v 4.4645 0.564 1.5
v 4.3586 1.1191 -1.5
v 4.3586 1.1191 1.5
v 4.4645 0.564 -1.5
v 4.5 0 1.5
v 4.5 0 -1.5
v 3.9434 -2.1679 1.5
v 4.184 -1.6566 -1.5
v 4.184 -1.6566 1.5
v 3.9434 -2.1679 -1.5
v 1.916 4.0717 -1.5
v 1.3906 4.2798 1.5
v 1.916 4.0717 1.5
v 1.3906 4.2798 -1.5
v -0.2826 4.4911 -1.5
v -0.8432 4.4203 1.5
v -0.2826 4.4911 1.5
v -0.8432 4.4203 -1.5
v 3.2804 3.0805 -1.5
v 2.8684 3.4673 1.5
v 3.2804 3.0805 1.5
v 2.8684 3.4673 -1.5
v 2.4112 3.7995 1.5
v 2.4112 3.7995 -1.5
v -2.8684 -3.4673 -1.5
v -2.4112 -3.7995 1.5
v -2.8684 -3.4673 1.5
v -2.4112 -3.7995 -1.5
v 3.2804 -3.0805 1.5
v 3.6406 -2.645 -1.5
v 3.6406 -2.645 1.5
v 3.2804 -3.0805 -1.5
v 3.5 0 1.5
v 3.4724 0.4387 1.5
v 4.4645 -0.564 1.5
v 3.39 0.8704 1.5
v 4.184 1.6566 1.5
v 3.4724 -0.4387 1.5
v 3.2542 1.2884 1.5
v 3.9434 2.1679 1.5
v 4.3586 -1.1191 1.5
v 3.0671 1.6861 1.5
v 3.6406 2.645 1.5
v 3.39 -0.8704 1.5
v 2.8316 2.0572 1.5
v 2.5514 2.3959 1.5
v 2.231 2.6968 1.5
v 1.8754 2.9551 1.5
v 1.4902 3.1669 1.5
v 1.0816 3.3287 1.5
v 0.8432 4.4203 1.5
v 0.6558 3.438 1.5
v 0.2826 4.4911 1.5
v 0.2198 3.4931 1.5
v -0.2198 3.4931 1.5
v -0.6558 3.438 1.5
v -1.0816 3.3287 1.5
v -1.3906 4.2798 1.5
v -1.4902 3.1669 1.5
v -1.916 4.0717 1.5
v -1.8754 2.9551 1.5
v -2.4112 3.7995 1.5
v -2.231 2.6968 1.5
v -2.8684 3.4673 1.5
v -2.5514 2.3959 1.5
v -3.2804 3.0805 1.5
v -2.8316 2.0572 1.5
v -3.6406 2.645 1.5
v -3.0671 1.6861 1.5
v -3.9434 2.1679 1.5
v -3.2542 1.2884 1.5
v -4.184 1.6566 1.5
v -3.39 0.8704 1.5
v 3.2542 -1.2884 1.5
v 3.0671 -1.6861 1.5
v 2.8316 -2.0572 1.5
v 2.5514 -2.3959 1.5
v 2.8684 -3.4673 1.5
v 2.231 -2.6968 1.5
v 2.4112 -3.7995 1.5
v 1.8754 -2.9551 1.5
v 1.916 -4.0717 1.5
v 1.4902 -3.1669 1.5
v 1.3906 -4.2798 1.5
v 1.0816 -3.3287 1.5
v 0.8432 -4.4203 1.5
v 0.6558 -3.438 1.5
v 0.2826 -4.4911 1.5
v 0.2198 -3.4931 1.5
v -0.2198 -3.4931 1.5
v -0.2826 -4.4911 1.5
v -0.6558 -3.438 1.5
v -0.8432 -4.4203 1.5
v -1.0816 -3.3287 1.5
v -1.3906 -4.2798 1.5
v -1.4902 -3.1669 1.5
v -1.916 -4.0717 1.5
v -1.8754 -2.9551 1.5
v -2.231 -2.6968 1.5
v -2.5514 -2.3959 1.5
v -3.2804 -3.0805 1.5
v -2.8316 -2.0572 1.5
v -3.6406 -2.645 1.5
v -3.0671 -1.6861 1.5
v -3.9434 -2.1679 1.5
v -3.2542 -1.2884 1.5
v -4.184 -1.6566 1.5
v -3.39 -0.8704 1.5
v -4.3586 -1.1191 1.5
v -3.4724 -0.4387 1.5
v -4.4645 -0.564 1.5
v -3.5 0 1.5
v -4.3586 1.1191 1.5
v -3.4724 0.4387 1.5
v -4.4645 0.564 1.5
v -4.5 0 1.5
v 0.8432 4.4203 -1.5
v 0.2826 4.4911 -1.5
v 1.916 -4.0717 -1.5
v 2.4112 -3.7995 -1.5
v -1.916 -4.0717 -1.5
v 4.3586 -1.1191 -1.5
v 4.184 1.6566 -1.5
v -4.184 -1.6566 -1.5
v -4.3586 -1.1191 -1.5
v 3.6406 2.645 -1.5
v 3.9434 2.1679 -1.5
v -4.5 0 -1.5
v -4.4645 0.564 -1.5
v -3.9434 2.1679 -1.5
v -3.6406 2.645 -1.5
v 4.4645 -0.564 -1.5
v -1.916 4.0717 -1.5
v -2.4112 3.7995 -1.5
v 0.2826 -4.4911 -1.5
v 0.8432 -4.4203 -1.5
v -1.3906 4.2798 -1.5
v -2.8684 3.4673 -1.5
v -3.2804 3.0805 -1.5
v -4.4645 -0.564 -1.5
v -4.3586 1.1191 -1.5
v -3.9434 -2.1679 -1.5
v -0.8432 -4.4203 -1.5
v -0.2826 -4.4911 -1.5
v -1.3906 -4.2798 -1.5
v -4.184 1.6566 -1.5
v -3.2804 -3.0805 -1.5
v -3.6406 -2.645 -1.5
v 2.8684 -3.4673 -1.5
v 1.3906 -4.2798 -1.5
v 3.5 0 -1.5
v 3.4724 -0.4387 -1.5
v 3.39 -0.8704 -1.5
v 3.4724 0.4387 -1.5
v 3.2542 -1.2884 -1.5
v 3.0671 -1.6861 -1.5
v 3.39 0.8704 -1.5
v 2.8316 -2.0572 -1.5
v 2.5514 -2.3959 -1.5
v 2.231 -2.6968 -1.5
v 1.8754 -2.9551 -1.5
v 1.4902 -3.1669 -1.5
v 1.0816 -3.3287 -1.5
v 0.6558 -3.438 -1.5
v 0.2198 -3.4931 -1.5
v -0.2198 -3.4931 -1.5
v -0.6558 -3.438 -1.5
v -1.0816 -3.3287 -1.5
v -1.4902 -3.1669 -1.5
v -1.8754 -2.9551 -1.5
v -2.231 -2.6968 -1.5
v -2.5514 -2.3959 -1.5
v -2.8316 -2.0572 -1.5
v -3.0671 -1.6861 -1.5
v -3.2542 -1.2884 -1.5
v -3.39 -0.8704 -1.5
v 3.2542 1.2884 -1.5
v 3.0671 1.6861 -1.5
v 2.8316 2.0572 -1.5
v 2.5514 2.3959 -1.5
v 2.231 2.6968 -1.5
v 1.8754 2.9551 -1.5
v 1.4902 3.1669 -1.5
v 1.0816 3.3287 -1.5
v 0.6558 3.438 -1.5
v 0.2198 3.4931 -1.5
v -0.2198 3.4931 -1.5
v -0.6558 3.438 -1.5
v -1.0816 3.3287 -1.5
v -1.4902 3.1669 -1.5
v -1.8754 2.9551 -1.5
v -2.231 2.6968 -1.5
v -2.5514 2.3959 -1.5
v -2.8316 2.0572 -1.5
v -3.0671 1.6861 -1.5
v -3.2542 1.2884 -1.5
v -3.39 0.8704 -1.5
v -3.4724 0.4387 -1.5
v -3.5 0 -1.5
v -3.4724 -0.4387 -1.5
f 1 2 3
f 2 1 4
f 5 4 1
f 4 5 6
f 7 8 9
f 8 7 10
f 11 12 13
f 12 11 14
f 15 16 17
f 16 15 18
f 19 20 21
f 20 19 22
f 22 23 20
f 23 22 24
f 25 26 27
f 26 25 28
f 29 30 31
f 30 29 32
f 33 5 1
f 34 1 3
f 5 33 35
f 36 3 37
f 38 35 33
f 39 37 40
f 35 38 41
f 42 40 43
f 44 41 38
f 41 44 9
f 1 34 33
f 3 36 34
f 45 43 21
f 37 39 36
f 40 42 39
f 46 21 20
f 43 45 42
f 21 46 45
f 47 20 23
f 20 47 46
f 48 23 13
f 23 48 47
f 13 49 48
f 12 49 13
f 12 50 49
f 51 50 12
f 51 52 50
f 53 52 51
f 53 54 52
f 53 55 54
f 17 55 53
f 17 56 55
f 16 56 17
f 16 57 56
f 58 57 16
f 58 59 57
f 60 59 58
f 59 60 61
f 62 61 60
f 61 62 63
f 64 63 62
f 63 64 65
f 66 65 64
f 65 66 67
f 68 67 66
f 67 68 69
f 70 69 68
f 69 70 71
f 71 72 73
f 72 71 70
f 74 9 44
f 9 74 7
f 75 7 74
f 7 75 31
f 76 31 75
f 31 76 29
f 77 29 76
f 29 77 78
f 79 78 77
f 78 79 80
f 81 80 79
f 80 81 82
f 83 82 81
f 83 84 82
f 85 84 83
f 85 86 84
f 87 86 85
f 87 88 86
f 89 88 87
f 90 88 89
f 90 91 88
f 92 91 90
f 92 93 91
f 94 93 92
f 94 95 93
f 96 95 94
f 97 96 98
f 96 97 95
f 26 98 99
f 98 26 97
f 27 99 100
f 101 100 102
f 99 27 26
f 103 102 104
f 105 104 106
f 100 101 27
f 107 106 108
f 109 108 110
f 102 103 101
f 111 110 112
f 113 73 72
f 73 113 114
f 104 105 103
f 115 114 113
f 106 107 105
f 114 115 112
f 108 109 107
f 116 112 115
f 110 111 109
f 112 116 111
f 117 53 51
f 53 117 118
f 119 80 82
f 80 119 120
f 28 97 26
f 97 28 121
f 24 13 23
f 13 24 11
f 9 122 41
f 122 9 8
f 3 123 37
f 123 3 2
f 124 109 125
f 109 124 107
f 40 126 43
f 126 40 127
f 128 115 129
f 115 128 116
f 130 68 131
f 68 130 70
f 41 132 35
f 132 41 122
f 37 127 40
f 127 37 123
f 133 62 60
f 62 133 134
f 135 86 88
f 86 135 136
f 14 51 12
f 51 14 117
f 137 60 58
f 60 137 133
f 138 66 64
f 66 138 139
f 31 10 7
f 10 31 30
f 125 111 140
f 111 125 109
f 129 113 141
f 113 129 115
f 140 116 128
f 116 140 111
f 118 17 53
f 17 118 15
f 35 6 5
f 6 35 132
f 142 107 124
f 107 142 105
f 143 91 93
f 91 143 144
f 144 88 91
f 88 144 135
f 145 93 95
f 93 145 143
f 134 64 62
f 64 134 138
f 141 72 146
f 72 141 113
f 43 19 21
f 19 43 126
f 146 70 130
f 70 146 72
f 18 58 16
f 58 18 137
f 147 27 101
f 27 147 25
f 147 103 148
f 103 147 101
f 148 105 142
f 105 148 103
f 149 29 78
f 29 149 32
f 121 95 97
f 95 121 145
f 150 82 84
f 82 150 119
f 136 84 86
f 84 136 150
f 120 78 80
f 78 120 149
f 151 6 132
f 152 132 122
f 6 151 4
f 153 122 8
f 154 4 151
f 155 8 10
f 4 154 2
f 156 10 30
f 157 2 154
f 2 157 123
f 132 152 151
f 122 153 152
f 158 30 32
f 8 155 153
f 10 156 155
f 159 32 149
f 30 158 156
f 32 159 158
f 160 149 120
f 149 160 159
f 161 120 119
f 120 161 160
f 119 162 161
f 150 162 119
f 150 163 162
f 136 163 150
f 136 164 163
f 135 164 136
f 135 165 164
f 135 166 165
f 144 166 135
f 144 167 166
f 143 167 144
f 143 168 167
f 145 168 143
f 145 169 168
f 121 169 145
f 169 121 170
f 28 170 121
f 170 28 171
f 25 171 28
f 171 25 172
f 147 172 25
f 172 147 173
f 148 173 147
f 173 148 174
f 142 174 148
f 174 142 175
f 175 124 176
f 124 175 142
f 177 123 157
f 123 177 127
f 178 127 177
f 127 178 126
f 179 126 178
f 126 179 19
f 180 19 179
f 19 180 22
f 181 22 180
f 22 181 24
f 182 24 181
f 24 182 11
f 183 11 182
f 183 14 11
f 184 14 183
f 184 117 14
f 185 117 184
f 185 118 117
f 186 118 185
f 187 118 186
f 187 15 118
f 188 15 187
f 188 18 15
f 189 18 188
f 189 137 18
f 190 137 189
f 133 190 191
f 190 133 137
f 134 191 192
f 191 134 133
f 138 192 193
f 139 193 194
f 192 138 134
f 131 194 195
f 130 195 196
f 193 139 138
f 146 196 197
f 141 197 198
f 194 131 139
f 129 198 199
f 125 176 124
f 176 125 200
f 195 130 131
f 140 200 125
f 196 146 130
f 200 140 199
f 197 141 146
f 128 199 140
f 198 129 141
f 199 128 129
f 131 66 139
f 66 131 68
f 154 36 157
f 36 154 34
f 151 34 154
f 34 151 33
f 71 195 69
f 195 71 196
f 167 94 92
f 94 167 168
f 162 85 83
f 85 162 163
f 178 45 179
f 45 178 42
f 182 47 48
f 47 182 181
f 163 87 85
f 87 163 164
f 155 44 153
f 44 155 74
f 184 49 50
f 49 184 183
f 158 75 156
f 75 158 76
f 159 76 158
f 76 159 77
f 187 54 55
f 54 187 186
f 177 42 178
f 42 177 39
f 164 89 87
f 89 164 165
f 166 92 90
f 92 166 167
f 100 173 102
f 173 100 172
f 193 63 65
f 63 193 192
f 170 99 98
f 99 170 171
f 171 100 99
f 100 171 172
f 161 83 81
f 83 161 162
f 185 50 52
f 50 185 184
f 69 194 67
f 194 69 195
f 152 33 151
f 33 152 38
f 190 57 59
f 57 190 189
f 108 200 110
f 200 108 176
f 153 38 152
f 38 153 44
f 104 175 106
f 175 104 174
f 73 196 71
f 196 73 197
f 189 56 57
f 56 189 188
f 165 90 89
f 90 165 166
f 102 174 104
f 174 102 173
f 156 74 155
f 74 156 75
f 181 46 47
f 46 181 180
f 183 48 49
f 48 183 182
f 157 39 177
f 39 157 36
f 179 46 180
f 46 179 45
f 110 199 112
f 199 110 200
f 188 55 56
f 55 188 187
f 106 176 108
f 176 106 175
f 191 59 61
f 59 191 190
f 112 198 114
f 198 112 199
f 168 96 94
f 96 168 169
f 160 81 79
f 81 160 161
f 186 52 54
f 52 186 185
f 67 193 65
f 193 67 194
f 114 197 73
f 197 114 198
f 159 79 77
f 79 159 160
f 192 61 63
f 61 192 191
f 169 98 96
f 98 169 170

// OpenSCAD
$fn = 50;


difference() {
	union() {
		translate(v = [0, 0, -1.5000000000]) {
			cylinder(h = 3, r = 4.5000000000);
		}
	}
	union() {
		translate(v = [0, 0, -100.0000000000]) {
			cylinder(h = 200, r = 3.5000000000);
		}
	}
}
